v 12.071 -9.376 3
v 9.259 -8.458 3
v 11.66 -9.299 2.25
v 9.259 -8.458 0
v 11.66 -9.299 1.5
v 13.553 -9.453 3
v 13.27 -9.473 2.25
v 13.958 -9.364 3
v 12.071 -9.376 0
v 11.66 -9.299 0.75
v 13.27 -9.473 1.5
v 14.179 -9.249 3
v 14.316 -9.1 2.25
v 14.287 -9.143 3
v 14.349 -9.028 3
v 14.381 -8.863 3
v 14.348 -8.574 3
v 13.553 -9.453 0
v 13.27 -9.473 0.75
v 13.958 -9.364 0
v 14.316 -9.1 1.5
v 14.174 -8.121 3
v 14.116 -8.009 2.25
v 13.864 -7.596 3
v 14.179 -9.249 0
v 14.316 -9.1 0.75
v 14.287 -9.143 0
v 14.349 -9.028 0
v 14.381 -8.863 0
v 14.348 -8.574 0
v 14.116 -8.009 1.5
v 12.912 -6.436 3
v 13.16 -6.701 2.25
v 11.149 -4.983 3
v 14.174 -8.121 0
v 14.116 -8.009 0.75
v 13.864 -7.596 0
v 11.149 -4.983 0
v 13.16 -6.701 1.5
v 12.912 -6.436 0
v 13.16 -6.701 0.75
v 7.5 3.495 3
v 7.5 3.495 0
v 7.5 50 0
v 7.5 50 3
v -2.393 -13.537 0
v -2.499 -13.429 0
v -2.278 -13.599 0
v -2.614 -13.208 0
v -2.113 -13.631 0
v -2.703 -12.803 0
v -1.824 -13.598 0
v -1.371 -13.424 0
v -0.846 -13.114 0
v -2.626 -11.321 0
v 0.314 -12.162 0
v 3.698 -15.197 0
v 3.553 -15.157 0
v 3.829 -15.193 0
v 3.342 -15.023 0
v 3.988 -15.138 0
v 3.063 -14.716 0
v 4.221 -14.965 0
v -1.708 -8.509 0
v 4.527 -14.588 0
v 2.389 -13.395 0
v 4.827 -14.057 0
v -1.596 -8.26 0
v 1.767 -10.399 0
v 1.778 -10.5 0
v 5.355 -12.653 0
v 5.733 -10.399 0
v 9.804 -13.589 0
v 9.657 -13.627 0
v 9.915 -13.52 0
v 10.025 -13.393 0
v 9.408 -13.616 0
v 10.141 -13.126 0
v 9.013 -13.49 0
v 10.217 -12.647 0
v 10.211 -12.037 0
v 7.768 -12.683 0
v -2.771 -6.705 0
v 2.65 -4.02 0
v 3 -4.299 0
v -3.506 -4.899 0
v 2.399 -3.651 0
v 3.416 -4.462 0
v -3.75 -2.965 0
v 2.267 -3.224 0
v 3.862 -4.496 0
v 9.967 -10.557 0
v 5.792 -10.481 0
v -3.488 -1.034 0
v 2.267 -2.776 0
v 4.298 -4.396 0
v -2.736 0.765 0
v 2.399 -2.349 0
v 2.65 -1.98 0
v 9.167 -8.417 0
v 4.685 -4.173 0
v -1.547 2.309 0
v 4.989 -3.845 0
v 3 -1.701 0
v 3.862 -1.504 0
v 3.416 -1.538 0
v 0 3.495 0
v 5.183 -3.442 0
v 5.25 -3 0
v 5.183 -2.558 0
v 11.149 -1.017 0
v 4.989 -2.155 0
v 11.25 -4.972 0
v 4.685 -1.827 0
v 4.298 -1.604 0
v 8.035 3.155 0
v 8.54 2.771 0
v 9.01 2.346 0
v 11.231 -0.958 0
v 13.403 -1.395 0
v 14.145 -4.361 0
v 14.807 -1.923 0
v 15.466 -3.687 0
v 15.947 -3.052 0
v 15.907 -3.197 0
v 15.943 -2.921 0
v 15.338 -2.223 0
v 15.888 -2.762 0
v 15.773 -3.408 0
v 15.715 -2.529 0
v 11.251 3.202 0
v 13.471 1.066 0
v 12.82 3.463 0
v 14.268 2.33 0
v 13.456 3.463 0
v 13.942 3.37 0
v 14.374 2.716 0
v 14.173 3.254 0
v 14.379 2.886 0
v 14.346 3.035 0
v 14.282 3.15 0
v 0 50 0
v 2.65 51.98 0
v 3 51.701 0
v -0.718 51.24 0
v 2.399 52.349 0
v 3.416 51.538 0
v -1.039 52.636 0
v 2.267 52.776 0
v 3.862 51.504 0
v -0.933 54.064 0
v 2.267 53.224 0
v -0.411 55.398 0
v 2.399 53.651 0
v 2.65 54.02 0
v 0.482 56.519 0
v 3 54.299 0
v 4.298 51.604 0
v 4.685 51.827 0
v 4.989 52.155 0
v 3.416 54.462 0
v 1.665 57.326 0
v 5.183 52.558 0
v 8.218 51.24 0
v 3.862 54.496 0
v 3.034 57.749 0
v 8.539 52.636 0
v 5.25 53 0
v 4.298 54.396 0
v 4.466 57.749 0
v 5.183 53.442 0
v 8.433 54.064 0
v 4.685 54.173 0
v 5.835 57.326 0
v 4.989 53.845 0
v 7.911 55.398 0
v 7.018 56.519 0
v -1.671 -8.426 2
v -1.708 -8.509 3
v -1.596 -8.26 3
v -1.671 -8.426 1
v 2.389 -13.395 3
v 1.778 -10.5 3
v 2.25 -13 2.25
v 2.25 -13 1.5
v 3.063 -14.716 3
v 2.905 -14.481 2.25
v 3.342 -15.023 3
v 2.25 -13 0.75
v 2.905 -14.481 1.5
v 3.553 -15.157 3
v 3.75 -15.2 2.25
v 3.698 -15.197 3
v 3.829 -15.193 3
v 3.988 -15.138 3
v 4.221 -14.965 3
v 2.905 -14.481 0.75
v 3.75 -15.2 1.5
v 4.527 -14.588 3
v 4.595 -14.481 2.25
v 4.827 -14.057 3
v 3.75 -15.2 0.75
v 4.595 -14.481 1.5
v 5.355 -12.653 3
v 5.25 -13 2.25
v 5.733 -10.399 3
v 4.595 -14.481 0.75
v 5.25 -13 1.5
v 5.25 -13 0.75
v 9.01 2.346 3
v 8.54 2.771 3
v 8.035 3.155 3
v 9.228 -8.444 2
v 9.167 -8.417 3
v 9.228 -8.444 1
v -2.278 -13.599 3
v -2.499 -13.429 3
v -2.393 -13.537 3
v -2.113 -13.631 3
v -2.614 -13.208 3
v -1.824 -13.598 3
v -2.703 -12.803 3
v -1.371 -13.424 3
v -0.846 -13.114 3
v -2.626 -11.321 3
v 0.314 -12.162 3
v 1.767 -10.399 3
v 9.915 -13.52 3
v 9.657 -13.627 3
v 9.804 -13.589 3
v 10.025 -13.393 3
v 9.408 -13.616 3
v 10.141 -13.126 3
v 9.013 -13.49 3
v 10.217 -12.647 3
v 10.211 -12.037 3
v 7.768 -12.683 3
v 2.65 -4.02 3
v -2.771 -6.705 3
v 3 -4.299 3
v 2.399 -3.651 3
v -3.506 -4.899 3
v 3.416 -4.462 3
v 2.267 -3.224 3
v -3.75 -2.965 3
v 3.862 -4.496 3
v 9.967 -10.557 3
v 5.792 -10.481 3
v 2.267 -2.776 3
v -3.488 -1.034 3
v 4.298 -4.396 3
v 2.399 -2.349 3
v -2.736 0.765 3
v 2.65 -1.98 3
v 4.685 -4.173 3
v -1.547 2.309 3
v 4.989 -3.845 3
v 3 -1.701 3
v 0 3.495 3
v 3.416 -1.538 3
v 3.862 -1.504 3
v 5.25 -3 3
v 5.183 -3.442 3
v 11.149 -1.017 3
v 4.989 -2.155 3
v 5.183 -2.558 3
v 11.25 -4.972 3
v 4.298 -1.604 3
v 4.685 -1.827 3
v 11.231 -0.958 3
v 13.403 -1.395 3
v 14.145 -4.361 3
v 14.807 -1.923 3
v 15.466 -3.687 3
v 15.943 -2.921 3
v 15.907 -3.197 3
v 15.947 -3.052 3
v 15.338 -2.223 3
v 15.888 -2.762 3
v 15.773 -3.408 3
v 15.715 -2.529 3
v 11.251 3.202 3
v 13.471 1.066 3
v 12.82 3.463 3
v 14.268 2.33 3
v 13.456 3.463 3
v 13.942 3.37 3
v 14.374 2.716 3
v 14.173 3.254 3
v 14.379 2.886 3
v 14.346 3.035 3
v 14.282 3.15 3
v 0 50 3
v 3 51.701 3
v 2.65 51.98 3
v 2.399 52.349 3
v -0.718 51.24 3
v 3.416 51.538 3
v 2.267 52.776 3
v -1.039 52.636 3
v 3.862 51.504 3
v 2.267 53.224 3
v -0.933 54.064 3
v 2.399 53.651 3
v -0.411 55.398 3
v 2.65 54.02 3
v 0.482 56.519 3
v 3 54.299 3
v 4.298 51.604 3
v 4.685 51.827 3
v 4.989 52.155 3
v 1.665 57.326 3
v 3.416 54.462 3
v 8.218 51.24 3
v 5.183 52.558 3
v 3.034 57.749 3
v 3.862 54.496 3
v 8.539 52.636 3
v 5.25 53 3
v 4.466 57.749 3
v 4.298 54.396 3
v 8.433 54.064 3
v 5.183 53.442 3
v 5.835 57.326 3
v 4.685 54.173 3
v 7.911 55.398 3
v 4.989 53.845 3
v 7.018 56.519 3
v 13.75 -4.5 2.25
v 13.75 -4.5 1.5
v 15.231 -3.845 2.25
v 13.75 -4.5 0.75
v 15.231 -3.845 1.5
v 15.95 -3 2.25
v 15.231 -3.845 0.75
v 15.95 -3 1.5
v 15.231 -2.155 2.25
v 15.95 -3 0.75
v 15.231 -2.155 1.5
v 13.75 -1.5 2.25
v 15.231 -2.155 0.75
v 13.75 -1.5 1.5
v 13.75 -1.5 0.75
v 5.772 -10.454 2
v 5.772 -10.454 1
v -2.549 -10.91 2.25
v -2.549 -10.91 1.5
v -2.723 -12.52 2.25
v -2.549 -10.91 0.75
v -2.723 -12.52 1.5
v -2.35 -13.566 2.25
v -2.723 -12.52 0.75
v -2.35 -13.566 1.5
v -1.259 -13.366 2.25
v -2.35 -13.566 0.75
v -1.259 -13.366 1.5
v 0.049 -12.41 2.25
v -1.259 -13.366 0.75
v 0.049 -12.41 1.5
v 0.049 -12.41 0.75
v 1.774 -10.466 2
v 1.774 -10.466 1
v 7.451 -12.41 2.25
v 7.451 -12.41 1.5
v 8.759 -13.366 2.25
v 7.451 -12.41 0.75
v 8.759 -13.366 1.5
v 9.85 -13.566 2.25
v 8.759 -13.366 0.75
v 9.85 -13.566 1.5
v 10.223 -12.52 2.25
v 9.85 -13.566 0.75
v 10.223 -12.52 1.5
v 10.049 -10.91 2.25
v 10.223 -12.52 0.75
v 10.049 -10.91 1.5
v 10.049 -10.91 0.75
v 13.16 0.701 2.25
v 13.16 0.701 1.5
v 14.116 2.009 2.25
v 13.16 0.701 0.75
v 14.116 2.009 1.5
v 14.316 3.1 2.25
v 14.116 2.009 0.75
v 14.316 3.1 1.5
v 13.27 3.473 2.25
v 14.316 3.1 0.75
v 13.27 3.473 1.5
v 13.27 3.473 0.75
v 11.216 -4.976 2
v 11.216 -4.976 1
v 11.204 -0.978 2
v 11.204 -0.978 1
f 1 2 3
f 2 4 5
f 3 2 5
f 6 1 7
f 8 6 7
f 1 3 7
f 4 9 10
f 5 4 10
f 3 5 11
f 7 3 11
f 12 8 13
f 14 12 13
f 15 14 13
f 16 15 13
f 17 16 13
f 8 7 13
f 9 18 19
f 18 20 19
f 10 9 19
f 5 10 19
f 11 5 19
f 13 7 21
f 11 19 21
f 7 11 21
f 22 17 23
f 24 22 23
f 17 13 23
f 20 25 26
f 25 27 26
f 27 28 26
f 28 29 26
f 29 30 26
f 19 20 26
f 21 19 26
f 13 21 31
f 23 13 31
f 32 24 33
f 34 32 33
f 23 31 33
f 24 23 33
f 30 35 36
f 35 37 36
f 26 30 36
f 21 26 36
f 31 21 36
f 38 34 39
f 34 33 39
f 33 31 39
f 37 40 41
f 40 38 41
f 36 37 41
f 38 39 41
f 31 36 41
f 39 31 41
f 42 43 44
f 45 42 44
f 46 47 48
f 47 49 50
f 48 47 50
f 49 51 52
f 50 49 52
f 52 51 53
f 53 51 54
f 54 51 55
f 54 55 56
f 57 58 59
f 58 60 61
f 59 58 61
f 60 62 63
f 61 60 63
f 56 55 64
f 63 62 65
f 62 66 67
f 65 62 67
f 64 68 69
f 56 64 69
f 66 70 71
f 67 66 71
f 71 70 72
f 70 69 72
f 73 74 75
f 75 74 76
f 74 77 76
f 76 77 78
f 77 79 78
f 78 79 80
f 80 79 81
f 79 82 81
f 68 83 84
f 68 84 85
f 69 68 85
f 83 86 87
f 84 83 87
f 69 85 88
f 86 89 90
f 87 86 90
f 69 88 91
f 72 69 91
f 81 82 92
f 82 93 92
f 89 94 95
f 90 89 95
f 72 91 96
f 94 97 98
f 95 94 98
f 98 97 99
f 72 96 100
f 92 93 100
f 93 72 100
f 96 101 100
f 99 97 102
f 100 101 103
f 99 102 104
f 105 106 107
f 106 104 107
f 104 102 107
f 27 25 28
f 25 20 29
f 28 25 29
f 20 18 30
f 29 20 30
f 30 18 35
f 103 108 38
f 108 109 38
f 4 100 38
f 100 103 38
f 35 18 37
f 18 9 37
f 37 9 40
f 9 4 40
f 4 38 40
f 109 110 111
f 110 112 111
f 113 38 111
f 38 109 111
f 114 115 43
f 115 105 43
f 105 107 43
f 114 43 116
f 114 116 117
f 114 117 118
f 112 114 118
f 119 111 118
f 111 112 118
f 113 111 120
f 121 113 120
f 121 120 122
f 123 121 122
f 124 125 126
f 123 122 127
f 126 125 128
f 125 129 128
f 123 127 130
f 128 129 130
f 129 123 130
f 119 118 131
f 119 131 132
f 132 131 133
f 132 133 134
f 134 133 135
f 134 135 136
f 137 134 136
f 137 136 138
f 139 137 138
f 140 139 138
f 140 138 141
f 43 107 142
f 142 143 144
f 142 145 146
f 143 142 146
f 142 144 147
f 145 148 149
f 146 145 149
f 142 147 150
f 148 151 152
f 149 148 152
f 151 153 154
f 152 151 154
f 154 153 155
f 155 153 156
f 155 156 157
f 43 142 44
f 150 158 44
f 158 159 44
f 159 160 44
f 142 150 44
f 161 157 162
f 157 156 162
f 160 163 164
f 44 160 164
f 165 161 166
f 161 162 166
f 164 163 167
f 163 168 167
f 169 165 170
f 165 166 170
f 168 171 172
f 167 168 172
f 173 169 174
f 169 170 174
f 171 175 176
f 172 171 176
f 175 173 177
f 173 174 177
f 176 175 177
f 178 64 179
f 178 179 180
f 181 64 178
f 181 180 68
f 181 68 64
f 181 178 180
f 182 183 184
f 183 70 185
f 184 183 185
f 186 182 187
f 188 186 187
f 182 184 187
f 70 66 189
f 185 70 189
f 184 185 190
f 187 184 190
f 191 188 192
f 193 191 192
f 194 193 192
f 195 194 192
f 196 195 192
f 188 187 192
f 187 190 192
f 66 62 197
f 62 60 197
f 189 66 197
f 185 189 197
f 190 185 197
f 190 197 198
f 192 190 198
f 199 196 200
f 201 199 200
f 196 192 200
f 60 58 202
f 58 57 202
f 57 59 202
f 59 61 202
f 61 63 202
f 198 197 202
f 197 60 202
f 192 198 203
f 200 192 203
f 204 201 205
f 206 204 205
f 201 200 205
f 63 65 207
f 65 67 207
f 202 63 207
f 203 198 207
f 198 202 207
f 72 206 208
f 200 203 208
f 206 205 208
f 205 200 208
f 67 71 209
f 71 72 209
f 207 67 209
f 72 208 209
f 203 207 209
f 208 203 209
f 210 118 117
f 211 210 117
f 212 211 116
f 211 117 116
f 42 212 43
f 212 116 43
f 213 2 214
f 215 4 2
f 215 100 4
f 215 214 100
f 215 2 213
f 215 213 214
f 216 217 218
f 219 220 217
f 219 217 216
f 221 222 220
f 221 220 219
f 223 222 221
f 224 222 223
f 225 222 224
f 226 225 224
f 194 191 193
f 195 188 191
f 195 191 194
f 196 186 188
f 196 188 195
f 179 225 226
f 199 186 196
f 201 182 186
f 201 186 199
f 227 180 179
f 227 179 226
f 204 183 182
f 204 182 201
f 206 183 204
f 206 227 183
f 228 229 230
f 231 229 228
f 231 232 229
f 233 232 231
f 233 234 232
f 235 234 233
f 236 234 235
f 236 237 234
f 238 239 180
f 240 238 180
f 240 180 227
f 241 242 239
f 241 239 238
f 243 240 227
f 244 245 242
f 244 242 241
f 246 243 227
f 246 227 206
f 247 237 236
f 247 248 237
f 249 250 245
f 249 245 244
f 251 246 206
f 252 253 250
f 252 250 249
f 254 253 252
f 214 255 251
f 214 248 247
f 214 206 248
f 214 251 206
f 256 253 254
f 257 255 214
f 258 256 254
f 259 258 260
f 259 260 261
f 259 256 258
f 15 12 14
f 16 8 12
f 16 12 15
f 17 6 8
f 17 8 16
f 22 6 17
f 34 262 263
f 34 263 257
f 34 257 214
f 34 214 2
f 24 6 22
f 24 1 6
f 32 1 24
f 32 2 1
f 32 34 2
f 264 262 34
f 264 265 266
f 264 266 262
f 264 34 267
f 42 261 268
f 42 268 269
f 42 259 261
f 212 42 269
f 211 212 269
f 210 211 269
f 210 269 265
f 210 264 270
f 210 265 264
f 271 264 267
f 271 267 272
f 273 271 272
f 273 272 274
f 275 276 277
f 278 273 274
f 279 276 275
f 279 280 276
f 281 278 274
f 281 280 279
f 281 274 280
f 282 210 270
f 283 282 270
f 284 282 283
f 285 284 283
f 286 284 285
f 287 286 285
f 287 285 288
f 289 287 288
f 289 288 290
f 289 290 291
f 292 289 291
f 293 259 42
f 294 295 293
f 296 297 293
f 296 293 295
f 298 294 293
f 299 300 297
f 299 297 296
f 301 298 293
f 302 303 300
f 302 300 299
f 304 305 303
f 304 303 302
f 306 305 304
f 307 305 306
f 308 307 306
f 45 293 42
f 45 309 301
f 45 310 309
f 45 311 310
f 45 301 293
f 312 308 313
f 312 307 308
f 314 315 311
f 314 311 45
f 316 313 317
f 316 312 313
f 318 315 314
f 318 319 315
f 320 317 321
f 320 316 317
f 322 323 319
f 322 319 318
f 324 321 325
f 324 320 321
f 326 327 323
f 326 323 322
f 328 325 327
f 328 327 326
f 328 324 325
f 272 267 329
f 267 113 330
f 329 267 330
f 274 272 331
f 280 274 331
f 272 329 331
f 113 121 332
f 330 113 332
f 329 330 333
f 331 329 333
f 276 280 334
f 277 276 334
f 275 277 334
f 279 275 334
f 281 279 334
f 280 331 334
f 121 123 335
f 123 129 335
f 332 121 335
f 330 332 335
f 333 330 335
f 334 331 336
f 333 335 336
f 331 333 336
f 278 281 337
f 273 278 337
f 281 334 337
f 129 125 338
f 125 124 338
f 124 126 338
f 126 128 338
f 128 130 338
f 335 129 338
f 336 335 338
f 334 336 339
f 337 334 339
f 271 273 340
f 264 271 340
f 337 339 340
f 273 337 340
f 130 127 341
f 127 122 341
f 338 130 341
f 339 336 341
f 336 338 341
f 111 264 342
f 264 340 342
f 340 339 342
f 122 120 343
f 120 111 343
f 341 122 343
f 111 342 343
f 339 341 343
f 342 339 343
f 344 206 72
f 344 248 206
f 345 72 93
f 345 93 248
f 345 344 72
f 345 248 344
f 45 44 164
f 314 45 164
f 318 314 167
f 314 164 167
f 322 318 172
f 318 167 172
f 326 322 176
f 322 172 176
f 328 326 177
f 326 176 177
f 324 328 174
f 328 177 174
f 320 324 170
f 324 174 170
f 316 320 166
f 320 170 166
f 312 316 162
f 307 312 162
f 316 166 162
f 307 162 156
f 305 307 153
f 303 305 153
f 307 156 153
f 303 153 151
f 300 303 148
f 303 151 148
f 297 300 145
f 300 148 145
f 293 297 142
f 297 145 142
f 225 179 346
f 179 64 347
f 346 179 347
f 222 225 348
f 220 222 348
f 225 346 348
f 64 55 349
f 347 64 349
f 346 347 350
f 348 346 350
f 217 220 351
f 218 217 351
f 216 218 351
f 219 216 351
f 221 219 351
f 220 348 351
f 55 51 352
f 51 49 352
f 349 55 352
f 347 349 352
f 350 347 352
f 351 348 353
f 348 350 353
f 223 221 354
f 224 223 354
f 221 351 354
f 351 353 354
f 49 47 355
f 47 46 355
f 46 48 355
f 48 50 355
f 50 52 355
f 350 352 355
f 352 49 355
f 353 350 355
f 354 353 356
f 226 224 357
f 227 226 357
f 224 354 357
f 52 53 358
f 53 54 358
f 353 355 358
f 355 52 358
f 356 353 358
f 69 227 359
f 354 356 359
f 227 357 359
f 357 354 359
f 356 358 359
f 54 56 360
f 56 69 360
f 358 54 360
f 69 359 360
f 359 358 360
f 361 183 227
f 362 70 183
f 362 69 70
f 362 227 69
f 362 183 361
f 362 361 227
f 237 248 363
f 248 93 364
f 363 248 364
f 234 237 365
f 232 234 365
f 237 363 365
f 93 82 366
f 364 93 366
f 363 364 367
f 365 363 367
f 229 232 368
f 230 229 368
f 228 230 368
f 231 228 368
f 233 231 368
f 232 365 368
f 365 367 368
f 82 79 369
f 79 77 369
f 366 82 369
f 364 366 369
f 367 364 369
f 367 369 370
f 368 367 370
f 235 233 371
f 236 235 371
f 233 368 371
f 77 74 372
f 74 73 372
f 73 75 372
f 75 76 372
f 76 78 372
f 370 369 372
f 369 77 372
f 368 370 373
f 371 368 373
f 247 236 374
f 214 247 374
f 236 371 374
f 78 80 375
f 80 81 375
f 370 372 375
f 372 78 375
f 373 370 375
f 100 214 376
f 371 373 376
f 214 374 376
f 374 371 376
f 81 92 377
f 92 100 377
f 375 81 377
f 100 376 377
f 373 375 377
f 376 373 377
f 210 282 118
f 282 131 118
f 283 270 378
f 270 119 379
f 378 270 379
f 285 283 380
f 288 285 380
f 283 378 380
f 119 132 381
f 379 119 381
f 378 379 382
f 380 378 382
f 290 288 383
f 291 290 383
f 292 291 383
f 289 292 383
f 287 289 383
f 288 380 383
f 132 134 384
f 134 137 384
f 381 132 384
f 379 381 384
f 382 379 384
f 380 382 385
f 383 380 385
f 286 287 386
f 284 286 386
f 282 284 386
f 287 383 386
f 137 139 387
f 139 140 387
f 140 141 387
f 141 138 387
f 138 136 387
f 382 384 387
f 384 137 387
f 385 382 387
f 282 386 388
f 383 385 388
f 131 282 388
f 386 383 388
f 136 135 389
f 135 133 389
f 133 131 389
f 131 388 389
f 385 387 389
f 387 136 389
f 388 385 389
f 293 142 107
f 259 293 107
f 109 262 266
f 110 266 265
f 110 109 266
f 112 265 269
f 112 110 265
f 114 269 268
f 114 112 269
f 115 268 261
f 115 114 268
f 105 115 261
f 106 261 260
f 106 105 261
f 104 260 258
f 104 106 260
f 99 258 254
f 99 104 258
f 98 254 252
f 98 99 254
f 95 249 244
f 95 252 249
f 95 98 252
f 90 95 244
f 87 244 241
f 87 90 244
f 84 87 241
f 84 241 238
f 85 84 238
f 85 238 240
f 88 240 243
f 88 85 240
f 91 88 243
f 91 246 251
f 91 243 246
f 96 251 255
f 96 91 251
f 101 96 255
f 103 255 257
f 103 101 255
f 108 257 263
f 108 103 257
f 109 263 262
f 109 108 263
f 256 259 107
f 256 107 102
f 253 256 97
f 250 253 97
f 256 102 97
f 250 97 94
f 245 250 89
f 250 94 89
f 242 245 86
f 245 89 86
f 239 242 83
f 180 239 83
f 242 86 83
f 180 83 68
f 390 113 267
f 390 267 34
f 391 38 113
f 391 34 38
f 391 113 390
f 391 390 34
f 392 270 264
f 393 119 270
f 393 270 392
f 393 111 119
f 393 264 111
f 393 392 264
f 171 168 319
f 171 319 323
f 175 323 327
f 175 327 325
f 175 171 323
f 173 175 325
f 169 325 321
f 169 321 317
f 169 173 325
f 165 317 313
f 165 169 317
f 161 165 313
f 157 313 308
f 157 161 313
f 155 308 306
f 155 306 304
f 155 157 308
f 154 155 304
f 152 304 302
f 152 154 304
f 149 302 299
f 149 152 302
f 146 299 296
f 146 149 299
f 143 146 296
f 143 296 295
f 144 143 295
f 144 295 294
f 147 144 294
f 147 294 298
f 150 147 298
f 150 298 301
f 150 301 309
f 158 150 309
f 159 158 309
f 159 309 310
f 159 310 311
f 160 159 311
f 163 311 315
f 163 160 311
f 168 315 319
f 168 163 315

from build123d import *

# Parameters (mm, degrees)
F0_R     = 1.5
F1_DEPTH = 3
F2_COUNT = 5
F2_ANGLE = 120
F3_COUNT = 2
F3_ANGLE = 30
F4_DEPTH = 3


with BuildPart() as f1:
    # F0 (on Top) → F1 (new body)
    with BuildSketch(Plane.XY):
        with BuildLine():
            ThreePointArc((10.9784161474, -5), (11.1817938987, -4.0091776094), (11.25, -3))
            ThreePointArc((11.25, -3), (11.1817938987, -1.9908223906), (10.9784161474, -1))
            ThreePointArc((10.9784161474, -1), (9.6815335073, 1.589870396), (7.5, 3.4951905284))
            ThreePointArc((7.5, 3.4951905284), (3.75, 4.5), (0, 3.4951905284))
            ThreePointArc((0, 3.4951905284), (-0.839870396, -8.9315335073), (10.9784161474, -5))
        make_face()
        with Locations((3.75, -3)):
            Circle(F0_R, mode=Mode.SUBTRACT)
        with BuildLine():
            ThreePointArc((10.9784161474, -1), (11.1817938987, -1.9908223906), (11.25, -3))
            Line((11.25, -3), (15.95, -3))
            add(Edge.make_bspline(
                [(10.9784161474, -1), (11.8350186835, -1.0881504393), (13.5497251572, -1.2295209379), (15.95, -2.4153828237), (15.95, -3)],
                knots=[0, 0, 0, 0, 0.2535053688, 0.5, 0.5, 0.5, 0.5], degree=3))
        make_face()
        with BuildLine():
            Line((15.95, -3), (11.25, -3))
            Line((11.25, -3), (11.25, -4.9723310697))
            add(Edge.make_bspline(
                [(15.95, -3), (15.95, -3.5846171763), (13.6780446635, -4.7070824839), (12.0203156214, -4.8937489666), (11.25, -4.9723310697)],
                knots=[0.5, 0.5, 0.5, 0.5, 0.7464946312, 0.9732698306, 0.9732698306, 0.9732698306, 0.9732698306], degree=3))
        make_face()
        with BuildLine():
            Line((11.25, -4.9723310697), (11.25, -3))
            ThreePointArc((11.25, -3), (11.1817938987, -4.0091776094), (10.9784161474, -5))
            add(Edge.make_bspline(
                [(11.25, -4.9723310697), (11.1592022977, -4.9815936034), (11.0687382223, -4.9907052218), (10.9784161474, -5)],
                knots=[0.9732698306, 0.9732698306, 0.9732698306, 0.9732698306, 1, 1, 1, 1], degree=3))
        make_face()
    extrude(amount=F1_DEPTH)


with BuildPart() as f2_1:
    # F2: instance of F1
    add(f1.part.rotate(Axis((3.75, -3, 3), (0, 0, -1)), 1 * F2_ANGLE / (F2_COUNT - 1)))


with BuildPart() as f2_2:
    # F2: instance of F1
    add(f1.part.rotate(Axis((3.75, -3, 3), (0, 0, -1)), 2 * F2_ANGLE / (F2_COUNT - 1)))


with BuildPart() as f2_3:
    # F2: instance of F1
    add(f1.part.rotate(Axis((3.75, -3, 3), (0, 0, -1)), 3 * F2_ANGLE / (F2_COUNT - 1)))


with BuildPart() as f2_4:
    # F2: instance of F1
    add(f1.part.rotate(Axis((3.75, -3, 3), (0, 0, -1)), 4 * F2_ANGLE / (F2_COUNT - 1)))


with BuildPart() as f3_1:
    # F3: instance of F1
    add(f1.part.rotate(Axis((3.75, -3, 0), (0, 0, 1)), 1 * F3_ANGLE / (F3_COUNT - 1)))


with BuildPart() as f1_1:
    add(f1.part)

    add(f2_1.part)  # F4 merges F2_1

    add(f2_2.part)  # F4 merges F2_2

    add(f2_3.part)  # F4 merges F2_3

    add(f2_4.part)  # F4 merges F2_4

    add(f3_1.part)  # F4 merges F3_1
    # F0 (on Top) → F4 (join)
    with BuildSketch(Plane.XY):
        with BuildLine():
            ThreePointArc((0, 3.4951905284), (3.75, 4.5), (7.5, 3.4951905284))
            Line((7.5, 3.4951905284), (7.5, 50))
            ThreePointArc((7.5, 50), (3.75, 57.8023431781), (0, 50))
            Line((0, 50), (0, 3.4951905284))
        make_face()
        with Locations((3.75, 53)):
            Circle(F0_R, mode=Mode.SUBTRACT)
    extrude(amount=F4_DEPTH)


solid = f1_1.part
